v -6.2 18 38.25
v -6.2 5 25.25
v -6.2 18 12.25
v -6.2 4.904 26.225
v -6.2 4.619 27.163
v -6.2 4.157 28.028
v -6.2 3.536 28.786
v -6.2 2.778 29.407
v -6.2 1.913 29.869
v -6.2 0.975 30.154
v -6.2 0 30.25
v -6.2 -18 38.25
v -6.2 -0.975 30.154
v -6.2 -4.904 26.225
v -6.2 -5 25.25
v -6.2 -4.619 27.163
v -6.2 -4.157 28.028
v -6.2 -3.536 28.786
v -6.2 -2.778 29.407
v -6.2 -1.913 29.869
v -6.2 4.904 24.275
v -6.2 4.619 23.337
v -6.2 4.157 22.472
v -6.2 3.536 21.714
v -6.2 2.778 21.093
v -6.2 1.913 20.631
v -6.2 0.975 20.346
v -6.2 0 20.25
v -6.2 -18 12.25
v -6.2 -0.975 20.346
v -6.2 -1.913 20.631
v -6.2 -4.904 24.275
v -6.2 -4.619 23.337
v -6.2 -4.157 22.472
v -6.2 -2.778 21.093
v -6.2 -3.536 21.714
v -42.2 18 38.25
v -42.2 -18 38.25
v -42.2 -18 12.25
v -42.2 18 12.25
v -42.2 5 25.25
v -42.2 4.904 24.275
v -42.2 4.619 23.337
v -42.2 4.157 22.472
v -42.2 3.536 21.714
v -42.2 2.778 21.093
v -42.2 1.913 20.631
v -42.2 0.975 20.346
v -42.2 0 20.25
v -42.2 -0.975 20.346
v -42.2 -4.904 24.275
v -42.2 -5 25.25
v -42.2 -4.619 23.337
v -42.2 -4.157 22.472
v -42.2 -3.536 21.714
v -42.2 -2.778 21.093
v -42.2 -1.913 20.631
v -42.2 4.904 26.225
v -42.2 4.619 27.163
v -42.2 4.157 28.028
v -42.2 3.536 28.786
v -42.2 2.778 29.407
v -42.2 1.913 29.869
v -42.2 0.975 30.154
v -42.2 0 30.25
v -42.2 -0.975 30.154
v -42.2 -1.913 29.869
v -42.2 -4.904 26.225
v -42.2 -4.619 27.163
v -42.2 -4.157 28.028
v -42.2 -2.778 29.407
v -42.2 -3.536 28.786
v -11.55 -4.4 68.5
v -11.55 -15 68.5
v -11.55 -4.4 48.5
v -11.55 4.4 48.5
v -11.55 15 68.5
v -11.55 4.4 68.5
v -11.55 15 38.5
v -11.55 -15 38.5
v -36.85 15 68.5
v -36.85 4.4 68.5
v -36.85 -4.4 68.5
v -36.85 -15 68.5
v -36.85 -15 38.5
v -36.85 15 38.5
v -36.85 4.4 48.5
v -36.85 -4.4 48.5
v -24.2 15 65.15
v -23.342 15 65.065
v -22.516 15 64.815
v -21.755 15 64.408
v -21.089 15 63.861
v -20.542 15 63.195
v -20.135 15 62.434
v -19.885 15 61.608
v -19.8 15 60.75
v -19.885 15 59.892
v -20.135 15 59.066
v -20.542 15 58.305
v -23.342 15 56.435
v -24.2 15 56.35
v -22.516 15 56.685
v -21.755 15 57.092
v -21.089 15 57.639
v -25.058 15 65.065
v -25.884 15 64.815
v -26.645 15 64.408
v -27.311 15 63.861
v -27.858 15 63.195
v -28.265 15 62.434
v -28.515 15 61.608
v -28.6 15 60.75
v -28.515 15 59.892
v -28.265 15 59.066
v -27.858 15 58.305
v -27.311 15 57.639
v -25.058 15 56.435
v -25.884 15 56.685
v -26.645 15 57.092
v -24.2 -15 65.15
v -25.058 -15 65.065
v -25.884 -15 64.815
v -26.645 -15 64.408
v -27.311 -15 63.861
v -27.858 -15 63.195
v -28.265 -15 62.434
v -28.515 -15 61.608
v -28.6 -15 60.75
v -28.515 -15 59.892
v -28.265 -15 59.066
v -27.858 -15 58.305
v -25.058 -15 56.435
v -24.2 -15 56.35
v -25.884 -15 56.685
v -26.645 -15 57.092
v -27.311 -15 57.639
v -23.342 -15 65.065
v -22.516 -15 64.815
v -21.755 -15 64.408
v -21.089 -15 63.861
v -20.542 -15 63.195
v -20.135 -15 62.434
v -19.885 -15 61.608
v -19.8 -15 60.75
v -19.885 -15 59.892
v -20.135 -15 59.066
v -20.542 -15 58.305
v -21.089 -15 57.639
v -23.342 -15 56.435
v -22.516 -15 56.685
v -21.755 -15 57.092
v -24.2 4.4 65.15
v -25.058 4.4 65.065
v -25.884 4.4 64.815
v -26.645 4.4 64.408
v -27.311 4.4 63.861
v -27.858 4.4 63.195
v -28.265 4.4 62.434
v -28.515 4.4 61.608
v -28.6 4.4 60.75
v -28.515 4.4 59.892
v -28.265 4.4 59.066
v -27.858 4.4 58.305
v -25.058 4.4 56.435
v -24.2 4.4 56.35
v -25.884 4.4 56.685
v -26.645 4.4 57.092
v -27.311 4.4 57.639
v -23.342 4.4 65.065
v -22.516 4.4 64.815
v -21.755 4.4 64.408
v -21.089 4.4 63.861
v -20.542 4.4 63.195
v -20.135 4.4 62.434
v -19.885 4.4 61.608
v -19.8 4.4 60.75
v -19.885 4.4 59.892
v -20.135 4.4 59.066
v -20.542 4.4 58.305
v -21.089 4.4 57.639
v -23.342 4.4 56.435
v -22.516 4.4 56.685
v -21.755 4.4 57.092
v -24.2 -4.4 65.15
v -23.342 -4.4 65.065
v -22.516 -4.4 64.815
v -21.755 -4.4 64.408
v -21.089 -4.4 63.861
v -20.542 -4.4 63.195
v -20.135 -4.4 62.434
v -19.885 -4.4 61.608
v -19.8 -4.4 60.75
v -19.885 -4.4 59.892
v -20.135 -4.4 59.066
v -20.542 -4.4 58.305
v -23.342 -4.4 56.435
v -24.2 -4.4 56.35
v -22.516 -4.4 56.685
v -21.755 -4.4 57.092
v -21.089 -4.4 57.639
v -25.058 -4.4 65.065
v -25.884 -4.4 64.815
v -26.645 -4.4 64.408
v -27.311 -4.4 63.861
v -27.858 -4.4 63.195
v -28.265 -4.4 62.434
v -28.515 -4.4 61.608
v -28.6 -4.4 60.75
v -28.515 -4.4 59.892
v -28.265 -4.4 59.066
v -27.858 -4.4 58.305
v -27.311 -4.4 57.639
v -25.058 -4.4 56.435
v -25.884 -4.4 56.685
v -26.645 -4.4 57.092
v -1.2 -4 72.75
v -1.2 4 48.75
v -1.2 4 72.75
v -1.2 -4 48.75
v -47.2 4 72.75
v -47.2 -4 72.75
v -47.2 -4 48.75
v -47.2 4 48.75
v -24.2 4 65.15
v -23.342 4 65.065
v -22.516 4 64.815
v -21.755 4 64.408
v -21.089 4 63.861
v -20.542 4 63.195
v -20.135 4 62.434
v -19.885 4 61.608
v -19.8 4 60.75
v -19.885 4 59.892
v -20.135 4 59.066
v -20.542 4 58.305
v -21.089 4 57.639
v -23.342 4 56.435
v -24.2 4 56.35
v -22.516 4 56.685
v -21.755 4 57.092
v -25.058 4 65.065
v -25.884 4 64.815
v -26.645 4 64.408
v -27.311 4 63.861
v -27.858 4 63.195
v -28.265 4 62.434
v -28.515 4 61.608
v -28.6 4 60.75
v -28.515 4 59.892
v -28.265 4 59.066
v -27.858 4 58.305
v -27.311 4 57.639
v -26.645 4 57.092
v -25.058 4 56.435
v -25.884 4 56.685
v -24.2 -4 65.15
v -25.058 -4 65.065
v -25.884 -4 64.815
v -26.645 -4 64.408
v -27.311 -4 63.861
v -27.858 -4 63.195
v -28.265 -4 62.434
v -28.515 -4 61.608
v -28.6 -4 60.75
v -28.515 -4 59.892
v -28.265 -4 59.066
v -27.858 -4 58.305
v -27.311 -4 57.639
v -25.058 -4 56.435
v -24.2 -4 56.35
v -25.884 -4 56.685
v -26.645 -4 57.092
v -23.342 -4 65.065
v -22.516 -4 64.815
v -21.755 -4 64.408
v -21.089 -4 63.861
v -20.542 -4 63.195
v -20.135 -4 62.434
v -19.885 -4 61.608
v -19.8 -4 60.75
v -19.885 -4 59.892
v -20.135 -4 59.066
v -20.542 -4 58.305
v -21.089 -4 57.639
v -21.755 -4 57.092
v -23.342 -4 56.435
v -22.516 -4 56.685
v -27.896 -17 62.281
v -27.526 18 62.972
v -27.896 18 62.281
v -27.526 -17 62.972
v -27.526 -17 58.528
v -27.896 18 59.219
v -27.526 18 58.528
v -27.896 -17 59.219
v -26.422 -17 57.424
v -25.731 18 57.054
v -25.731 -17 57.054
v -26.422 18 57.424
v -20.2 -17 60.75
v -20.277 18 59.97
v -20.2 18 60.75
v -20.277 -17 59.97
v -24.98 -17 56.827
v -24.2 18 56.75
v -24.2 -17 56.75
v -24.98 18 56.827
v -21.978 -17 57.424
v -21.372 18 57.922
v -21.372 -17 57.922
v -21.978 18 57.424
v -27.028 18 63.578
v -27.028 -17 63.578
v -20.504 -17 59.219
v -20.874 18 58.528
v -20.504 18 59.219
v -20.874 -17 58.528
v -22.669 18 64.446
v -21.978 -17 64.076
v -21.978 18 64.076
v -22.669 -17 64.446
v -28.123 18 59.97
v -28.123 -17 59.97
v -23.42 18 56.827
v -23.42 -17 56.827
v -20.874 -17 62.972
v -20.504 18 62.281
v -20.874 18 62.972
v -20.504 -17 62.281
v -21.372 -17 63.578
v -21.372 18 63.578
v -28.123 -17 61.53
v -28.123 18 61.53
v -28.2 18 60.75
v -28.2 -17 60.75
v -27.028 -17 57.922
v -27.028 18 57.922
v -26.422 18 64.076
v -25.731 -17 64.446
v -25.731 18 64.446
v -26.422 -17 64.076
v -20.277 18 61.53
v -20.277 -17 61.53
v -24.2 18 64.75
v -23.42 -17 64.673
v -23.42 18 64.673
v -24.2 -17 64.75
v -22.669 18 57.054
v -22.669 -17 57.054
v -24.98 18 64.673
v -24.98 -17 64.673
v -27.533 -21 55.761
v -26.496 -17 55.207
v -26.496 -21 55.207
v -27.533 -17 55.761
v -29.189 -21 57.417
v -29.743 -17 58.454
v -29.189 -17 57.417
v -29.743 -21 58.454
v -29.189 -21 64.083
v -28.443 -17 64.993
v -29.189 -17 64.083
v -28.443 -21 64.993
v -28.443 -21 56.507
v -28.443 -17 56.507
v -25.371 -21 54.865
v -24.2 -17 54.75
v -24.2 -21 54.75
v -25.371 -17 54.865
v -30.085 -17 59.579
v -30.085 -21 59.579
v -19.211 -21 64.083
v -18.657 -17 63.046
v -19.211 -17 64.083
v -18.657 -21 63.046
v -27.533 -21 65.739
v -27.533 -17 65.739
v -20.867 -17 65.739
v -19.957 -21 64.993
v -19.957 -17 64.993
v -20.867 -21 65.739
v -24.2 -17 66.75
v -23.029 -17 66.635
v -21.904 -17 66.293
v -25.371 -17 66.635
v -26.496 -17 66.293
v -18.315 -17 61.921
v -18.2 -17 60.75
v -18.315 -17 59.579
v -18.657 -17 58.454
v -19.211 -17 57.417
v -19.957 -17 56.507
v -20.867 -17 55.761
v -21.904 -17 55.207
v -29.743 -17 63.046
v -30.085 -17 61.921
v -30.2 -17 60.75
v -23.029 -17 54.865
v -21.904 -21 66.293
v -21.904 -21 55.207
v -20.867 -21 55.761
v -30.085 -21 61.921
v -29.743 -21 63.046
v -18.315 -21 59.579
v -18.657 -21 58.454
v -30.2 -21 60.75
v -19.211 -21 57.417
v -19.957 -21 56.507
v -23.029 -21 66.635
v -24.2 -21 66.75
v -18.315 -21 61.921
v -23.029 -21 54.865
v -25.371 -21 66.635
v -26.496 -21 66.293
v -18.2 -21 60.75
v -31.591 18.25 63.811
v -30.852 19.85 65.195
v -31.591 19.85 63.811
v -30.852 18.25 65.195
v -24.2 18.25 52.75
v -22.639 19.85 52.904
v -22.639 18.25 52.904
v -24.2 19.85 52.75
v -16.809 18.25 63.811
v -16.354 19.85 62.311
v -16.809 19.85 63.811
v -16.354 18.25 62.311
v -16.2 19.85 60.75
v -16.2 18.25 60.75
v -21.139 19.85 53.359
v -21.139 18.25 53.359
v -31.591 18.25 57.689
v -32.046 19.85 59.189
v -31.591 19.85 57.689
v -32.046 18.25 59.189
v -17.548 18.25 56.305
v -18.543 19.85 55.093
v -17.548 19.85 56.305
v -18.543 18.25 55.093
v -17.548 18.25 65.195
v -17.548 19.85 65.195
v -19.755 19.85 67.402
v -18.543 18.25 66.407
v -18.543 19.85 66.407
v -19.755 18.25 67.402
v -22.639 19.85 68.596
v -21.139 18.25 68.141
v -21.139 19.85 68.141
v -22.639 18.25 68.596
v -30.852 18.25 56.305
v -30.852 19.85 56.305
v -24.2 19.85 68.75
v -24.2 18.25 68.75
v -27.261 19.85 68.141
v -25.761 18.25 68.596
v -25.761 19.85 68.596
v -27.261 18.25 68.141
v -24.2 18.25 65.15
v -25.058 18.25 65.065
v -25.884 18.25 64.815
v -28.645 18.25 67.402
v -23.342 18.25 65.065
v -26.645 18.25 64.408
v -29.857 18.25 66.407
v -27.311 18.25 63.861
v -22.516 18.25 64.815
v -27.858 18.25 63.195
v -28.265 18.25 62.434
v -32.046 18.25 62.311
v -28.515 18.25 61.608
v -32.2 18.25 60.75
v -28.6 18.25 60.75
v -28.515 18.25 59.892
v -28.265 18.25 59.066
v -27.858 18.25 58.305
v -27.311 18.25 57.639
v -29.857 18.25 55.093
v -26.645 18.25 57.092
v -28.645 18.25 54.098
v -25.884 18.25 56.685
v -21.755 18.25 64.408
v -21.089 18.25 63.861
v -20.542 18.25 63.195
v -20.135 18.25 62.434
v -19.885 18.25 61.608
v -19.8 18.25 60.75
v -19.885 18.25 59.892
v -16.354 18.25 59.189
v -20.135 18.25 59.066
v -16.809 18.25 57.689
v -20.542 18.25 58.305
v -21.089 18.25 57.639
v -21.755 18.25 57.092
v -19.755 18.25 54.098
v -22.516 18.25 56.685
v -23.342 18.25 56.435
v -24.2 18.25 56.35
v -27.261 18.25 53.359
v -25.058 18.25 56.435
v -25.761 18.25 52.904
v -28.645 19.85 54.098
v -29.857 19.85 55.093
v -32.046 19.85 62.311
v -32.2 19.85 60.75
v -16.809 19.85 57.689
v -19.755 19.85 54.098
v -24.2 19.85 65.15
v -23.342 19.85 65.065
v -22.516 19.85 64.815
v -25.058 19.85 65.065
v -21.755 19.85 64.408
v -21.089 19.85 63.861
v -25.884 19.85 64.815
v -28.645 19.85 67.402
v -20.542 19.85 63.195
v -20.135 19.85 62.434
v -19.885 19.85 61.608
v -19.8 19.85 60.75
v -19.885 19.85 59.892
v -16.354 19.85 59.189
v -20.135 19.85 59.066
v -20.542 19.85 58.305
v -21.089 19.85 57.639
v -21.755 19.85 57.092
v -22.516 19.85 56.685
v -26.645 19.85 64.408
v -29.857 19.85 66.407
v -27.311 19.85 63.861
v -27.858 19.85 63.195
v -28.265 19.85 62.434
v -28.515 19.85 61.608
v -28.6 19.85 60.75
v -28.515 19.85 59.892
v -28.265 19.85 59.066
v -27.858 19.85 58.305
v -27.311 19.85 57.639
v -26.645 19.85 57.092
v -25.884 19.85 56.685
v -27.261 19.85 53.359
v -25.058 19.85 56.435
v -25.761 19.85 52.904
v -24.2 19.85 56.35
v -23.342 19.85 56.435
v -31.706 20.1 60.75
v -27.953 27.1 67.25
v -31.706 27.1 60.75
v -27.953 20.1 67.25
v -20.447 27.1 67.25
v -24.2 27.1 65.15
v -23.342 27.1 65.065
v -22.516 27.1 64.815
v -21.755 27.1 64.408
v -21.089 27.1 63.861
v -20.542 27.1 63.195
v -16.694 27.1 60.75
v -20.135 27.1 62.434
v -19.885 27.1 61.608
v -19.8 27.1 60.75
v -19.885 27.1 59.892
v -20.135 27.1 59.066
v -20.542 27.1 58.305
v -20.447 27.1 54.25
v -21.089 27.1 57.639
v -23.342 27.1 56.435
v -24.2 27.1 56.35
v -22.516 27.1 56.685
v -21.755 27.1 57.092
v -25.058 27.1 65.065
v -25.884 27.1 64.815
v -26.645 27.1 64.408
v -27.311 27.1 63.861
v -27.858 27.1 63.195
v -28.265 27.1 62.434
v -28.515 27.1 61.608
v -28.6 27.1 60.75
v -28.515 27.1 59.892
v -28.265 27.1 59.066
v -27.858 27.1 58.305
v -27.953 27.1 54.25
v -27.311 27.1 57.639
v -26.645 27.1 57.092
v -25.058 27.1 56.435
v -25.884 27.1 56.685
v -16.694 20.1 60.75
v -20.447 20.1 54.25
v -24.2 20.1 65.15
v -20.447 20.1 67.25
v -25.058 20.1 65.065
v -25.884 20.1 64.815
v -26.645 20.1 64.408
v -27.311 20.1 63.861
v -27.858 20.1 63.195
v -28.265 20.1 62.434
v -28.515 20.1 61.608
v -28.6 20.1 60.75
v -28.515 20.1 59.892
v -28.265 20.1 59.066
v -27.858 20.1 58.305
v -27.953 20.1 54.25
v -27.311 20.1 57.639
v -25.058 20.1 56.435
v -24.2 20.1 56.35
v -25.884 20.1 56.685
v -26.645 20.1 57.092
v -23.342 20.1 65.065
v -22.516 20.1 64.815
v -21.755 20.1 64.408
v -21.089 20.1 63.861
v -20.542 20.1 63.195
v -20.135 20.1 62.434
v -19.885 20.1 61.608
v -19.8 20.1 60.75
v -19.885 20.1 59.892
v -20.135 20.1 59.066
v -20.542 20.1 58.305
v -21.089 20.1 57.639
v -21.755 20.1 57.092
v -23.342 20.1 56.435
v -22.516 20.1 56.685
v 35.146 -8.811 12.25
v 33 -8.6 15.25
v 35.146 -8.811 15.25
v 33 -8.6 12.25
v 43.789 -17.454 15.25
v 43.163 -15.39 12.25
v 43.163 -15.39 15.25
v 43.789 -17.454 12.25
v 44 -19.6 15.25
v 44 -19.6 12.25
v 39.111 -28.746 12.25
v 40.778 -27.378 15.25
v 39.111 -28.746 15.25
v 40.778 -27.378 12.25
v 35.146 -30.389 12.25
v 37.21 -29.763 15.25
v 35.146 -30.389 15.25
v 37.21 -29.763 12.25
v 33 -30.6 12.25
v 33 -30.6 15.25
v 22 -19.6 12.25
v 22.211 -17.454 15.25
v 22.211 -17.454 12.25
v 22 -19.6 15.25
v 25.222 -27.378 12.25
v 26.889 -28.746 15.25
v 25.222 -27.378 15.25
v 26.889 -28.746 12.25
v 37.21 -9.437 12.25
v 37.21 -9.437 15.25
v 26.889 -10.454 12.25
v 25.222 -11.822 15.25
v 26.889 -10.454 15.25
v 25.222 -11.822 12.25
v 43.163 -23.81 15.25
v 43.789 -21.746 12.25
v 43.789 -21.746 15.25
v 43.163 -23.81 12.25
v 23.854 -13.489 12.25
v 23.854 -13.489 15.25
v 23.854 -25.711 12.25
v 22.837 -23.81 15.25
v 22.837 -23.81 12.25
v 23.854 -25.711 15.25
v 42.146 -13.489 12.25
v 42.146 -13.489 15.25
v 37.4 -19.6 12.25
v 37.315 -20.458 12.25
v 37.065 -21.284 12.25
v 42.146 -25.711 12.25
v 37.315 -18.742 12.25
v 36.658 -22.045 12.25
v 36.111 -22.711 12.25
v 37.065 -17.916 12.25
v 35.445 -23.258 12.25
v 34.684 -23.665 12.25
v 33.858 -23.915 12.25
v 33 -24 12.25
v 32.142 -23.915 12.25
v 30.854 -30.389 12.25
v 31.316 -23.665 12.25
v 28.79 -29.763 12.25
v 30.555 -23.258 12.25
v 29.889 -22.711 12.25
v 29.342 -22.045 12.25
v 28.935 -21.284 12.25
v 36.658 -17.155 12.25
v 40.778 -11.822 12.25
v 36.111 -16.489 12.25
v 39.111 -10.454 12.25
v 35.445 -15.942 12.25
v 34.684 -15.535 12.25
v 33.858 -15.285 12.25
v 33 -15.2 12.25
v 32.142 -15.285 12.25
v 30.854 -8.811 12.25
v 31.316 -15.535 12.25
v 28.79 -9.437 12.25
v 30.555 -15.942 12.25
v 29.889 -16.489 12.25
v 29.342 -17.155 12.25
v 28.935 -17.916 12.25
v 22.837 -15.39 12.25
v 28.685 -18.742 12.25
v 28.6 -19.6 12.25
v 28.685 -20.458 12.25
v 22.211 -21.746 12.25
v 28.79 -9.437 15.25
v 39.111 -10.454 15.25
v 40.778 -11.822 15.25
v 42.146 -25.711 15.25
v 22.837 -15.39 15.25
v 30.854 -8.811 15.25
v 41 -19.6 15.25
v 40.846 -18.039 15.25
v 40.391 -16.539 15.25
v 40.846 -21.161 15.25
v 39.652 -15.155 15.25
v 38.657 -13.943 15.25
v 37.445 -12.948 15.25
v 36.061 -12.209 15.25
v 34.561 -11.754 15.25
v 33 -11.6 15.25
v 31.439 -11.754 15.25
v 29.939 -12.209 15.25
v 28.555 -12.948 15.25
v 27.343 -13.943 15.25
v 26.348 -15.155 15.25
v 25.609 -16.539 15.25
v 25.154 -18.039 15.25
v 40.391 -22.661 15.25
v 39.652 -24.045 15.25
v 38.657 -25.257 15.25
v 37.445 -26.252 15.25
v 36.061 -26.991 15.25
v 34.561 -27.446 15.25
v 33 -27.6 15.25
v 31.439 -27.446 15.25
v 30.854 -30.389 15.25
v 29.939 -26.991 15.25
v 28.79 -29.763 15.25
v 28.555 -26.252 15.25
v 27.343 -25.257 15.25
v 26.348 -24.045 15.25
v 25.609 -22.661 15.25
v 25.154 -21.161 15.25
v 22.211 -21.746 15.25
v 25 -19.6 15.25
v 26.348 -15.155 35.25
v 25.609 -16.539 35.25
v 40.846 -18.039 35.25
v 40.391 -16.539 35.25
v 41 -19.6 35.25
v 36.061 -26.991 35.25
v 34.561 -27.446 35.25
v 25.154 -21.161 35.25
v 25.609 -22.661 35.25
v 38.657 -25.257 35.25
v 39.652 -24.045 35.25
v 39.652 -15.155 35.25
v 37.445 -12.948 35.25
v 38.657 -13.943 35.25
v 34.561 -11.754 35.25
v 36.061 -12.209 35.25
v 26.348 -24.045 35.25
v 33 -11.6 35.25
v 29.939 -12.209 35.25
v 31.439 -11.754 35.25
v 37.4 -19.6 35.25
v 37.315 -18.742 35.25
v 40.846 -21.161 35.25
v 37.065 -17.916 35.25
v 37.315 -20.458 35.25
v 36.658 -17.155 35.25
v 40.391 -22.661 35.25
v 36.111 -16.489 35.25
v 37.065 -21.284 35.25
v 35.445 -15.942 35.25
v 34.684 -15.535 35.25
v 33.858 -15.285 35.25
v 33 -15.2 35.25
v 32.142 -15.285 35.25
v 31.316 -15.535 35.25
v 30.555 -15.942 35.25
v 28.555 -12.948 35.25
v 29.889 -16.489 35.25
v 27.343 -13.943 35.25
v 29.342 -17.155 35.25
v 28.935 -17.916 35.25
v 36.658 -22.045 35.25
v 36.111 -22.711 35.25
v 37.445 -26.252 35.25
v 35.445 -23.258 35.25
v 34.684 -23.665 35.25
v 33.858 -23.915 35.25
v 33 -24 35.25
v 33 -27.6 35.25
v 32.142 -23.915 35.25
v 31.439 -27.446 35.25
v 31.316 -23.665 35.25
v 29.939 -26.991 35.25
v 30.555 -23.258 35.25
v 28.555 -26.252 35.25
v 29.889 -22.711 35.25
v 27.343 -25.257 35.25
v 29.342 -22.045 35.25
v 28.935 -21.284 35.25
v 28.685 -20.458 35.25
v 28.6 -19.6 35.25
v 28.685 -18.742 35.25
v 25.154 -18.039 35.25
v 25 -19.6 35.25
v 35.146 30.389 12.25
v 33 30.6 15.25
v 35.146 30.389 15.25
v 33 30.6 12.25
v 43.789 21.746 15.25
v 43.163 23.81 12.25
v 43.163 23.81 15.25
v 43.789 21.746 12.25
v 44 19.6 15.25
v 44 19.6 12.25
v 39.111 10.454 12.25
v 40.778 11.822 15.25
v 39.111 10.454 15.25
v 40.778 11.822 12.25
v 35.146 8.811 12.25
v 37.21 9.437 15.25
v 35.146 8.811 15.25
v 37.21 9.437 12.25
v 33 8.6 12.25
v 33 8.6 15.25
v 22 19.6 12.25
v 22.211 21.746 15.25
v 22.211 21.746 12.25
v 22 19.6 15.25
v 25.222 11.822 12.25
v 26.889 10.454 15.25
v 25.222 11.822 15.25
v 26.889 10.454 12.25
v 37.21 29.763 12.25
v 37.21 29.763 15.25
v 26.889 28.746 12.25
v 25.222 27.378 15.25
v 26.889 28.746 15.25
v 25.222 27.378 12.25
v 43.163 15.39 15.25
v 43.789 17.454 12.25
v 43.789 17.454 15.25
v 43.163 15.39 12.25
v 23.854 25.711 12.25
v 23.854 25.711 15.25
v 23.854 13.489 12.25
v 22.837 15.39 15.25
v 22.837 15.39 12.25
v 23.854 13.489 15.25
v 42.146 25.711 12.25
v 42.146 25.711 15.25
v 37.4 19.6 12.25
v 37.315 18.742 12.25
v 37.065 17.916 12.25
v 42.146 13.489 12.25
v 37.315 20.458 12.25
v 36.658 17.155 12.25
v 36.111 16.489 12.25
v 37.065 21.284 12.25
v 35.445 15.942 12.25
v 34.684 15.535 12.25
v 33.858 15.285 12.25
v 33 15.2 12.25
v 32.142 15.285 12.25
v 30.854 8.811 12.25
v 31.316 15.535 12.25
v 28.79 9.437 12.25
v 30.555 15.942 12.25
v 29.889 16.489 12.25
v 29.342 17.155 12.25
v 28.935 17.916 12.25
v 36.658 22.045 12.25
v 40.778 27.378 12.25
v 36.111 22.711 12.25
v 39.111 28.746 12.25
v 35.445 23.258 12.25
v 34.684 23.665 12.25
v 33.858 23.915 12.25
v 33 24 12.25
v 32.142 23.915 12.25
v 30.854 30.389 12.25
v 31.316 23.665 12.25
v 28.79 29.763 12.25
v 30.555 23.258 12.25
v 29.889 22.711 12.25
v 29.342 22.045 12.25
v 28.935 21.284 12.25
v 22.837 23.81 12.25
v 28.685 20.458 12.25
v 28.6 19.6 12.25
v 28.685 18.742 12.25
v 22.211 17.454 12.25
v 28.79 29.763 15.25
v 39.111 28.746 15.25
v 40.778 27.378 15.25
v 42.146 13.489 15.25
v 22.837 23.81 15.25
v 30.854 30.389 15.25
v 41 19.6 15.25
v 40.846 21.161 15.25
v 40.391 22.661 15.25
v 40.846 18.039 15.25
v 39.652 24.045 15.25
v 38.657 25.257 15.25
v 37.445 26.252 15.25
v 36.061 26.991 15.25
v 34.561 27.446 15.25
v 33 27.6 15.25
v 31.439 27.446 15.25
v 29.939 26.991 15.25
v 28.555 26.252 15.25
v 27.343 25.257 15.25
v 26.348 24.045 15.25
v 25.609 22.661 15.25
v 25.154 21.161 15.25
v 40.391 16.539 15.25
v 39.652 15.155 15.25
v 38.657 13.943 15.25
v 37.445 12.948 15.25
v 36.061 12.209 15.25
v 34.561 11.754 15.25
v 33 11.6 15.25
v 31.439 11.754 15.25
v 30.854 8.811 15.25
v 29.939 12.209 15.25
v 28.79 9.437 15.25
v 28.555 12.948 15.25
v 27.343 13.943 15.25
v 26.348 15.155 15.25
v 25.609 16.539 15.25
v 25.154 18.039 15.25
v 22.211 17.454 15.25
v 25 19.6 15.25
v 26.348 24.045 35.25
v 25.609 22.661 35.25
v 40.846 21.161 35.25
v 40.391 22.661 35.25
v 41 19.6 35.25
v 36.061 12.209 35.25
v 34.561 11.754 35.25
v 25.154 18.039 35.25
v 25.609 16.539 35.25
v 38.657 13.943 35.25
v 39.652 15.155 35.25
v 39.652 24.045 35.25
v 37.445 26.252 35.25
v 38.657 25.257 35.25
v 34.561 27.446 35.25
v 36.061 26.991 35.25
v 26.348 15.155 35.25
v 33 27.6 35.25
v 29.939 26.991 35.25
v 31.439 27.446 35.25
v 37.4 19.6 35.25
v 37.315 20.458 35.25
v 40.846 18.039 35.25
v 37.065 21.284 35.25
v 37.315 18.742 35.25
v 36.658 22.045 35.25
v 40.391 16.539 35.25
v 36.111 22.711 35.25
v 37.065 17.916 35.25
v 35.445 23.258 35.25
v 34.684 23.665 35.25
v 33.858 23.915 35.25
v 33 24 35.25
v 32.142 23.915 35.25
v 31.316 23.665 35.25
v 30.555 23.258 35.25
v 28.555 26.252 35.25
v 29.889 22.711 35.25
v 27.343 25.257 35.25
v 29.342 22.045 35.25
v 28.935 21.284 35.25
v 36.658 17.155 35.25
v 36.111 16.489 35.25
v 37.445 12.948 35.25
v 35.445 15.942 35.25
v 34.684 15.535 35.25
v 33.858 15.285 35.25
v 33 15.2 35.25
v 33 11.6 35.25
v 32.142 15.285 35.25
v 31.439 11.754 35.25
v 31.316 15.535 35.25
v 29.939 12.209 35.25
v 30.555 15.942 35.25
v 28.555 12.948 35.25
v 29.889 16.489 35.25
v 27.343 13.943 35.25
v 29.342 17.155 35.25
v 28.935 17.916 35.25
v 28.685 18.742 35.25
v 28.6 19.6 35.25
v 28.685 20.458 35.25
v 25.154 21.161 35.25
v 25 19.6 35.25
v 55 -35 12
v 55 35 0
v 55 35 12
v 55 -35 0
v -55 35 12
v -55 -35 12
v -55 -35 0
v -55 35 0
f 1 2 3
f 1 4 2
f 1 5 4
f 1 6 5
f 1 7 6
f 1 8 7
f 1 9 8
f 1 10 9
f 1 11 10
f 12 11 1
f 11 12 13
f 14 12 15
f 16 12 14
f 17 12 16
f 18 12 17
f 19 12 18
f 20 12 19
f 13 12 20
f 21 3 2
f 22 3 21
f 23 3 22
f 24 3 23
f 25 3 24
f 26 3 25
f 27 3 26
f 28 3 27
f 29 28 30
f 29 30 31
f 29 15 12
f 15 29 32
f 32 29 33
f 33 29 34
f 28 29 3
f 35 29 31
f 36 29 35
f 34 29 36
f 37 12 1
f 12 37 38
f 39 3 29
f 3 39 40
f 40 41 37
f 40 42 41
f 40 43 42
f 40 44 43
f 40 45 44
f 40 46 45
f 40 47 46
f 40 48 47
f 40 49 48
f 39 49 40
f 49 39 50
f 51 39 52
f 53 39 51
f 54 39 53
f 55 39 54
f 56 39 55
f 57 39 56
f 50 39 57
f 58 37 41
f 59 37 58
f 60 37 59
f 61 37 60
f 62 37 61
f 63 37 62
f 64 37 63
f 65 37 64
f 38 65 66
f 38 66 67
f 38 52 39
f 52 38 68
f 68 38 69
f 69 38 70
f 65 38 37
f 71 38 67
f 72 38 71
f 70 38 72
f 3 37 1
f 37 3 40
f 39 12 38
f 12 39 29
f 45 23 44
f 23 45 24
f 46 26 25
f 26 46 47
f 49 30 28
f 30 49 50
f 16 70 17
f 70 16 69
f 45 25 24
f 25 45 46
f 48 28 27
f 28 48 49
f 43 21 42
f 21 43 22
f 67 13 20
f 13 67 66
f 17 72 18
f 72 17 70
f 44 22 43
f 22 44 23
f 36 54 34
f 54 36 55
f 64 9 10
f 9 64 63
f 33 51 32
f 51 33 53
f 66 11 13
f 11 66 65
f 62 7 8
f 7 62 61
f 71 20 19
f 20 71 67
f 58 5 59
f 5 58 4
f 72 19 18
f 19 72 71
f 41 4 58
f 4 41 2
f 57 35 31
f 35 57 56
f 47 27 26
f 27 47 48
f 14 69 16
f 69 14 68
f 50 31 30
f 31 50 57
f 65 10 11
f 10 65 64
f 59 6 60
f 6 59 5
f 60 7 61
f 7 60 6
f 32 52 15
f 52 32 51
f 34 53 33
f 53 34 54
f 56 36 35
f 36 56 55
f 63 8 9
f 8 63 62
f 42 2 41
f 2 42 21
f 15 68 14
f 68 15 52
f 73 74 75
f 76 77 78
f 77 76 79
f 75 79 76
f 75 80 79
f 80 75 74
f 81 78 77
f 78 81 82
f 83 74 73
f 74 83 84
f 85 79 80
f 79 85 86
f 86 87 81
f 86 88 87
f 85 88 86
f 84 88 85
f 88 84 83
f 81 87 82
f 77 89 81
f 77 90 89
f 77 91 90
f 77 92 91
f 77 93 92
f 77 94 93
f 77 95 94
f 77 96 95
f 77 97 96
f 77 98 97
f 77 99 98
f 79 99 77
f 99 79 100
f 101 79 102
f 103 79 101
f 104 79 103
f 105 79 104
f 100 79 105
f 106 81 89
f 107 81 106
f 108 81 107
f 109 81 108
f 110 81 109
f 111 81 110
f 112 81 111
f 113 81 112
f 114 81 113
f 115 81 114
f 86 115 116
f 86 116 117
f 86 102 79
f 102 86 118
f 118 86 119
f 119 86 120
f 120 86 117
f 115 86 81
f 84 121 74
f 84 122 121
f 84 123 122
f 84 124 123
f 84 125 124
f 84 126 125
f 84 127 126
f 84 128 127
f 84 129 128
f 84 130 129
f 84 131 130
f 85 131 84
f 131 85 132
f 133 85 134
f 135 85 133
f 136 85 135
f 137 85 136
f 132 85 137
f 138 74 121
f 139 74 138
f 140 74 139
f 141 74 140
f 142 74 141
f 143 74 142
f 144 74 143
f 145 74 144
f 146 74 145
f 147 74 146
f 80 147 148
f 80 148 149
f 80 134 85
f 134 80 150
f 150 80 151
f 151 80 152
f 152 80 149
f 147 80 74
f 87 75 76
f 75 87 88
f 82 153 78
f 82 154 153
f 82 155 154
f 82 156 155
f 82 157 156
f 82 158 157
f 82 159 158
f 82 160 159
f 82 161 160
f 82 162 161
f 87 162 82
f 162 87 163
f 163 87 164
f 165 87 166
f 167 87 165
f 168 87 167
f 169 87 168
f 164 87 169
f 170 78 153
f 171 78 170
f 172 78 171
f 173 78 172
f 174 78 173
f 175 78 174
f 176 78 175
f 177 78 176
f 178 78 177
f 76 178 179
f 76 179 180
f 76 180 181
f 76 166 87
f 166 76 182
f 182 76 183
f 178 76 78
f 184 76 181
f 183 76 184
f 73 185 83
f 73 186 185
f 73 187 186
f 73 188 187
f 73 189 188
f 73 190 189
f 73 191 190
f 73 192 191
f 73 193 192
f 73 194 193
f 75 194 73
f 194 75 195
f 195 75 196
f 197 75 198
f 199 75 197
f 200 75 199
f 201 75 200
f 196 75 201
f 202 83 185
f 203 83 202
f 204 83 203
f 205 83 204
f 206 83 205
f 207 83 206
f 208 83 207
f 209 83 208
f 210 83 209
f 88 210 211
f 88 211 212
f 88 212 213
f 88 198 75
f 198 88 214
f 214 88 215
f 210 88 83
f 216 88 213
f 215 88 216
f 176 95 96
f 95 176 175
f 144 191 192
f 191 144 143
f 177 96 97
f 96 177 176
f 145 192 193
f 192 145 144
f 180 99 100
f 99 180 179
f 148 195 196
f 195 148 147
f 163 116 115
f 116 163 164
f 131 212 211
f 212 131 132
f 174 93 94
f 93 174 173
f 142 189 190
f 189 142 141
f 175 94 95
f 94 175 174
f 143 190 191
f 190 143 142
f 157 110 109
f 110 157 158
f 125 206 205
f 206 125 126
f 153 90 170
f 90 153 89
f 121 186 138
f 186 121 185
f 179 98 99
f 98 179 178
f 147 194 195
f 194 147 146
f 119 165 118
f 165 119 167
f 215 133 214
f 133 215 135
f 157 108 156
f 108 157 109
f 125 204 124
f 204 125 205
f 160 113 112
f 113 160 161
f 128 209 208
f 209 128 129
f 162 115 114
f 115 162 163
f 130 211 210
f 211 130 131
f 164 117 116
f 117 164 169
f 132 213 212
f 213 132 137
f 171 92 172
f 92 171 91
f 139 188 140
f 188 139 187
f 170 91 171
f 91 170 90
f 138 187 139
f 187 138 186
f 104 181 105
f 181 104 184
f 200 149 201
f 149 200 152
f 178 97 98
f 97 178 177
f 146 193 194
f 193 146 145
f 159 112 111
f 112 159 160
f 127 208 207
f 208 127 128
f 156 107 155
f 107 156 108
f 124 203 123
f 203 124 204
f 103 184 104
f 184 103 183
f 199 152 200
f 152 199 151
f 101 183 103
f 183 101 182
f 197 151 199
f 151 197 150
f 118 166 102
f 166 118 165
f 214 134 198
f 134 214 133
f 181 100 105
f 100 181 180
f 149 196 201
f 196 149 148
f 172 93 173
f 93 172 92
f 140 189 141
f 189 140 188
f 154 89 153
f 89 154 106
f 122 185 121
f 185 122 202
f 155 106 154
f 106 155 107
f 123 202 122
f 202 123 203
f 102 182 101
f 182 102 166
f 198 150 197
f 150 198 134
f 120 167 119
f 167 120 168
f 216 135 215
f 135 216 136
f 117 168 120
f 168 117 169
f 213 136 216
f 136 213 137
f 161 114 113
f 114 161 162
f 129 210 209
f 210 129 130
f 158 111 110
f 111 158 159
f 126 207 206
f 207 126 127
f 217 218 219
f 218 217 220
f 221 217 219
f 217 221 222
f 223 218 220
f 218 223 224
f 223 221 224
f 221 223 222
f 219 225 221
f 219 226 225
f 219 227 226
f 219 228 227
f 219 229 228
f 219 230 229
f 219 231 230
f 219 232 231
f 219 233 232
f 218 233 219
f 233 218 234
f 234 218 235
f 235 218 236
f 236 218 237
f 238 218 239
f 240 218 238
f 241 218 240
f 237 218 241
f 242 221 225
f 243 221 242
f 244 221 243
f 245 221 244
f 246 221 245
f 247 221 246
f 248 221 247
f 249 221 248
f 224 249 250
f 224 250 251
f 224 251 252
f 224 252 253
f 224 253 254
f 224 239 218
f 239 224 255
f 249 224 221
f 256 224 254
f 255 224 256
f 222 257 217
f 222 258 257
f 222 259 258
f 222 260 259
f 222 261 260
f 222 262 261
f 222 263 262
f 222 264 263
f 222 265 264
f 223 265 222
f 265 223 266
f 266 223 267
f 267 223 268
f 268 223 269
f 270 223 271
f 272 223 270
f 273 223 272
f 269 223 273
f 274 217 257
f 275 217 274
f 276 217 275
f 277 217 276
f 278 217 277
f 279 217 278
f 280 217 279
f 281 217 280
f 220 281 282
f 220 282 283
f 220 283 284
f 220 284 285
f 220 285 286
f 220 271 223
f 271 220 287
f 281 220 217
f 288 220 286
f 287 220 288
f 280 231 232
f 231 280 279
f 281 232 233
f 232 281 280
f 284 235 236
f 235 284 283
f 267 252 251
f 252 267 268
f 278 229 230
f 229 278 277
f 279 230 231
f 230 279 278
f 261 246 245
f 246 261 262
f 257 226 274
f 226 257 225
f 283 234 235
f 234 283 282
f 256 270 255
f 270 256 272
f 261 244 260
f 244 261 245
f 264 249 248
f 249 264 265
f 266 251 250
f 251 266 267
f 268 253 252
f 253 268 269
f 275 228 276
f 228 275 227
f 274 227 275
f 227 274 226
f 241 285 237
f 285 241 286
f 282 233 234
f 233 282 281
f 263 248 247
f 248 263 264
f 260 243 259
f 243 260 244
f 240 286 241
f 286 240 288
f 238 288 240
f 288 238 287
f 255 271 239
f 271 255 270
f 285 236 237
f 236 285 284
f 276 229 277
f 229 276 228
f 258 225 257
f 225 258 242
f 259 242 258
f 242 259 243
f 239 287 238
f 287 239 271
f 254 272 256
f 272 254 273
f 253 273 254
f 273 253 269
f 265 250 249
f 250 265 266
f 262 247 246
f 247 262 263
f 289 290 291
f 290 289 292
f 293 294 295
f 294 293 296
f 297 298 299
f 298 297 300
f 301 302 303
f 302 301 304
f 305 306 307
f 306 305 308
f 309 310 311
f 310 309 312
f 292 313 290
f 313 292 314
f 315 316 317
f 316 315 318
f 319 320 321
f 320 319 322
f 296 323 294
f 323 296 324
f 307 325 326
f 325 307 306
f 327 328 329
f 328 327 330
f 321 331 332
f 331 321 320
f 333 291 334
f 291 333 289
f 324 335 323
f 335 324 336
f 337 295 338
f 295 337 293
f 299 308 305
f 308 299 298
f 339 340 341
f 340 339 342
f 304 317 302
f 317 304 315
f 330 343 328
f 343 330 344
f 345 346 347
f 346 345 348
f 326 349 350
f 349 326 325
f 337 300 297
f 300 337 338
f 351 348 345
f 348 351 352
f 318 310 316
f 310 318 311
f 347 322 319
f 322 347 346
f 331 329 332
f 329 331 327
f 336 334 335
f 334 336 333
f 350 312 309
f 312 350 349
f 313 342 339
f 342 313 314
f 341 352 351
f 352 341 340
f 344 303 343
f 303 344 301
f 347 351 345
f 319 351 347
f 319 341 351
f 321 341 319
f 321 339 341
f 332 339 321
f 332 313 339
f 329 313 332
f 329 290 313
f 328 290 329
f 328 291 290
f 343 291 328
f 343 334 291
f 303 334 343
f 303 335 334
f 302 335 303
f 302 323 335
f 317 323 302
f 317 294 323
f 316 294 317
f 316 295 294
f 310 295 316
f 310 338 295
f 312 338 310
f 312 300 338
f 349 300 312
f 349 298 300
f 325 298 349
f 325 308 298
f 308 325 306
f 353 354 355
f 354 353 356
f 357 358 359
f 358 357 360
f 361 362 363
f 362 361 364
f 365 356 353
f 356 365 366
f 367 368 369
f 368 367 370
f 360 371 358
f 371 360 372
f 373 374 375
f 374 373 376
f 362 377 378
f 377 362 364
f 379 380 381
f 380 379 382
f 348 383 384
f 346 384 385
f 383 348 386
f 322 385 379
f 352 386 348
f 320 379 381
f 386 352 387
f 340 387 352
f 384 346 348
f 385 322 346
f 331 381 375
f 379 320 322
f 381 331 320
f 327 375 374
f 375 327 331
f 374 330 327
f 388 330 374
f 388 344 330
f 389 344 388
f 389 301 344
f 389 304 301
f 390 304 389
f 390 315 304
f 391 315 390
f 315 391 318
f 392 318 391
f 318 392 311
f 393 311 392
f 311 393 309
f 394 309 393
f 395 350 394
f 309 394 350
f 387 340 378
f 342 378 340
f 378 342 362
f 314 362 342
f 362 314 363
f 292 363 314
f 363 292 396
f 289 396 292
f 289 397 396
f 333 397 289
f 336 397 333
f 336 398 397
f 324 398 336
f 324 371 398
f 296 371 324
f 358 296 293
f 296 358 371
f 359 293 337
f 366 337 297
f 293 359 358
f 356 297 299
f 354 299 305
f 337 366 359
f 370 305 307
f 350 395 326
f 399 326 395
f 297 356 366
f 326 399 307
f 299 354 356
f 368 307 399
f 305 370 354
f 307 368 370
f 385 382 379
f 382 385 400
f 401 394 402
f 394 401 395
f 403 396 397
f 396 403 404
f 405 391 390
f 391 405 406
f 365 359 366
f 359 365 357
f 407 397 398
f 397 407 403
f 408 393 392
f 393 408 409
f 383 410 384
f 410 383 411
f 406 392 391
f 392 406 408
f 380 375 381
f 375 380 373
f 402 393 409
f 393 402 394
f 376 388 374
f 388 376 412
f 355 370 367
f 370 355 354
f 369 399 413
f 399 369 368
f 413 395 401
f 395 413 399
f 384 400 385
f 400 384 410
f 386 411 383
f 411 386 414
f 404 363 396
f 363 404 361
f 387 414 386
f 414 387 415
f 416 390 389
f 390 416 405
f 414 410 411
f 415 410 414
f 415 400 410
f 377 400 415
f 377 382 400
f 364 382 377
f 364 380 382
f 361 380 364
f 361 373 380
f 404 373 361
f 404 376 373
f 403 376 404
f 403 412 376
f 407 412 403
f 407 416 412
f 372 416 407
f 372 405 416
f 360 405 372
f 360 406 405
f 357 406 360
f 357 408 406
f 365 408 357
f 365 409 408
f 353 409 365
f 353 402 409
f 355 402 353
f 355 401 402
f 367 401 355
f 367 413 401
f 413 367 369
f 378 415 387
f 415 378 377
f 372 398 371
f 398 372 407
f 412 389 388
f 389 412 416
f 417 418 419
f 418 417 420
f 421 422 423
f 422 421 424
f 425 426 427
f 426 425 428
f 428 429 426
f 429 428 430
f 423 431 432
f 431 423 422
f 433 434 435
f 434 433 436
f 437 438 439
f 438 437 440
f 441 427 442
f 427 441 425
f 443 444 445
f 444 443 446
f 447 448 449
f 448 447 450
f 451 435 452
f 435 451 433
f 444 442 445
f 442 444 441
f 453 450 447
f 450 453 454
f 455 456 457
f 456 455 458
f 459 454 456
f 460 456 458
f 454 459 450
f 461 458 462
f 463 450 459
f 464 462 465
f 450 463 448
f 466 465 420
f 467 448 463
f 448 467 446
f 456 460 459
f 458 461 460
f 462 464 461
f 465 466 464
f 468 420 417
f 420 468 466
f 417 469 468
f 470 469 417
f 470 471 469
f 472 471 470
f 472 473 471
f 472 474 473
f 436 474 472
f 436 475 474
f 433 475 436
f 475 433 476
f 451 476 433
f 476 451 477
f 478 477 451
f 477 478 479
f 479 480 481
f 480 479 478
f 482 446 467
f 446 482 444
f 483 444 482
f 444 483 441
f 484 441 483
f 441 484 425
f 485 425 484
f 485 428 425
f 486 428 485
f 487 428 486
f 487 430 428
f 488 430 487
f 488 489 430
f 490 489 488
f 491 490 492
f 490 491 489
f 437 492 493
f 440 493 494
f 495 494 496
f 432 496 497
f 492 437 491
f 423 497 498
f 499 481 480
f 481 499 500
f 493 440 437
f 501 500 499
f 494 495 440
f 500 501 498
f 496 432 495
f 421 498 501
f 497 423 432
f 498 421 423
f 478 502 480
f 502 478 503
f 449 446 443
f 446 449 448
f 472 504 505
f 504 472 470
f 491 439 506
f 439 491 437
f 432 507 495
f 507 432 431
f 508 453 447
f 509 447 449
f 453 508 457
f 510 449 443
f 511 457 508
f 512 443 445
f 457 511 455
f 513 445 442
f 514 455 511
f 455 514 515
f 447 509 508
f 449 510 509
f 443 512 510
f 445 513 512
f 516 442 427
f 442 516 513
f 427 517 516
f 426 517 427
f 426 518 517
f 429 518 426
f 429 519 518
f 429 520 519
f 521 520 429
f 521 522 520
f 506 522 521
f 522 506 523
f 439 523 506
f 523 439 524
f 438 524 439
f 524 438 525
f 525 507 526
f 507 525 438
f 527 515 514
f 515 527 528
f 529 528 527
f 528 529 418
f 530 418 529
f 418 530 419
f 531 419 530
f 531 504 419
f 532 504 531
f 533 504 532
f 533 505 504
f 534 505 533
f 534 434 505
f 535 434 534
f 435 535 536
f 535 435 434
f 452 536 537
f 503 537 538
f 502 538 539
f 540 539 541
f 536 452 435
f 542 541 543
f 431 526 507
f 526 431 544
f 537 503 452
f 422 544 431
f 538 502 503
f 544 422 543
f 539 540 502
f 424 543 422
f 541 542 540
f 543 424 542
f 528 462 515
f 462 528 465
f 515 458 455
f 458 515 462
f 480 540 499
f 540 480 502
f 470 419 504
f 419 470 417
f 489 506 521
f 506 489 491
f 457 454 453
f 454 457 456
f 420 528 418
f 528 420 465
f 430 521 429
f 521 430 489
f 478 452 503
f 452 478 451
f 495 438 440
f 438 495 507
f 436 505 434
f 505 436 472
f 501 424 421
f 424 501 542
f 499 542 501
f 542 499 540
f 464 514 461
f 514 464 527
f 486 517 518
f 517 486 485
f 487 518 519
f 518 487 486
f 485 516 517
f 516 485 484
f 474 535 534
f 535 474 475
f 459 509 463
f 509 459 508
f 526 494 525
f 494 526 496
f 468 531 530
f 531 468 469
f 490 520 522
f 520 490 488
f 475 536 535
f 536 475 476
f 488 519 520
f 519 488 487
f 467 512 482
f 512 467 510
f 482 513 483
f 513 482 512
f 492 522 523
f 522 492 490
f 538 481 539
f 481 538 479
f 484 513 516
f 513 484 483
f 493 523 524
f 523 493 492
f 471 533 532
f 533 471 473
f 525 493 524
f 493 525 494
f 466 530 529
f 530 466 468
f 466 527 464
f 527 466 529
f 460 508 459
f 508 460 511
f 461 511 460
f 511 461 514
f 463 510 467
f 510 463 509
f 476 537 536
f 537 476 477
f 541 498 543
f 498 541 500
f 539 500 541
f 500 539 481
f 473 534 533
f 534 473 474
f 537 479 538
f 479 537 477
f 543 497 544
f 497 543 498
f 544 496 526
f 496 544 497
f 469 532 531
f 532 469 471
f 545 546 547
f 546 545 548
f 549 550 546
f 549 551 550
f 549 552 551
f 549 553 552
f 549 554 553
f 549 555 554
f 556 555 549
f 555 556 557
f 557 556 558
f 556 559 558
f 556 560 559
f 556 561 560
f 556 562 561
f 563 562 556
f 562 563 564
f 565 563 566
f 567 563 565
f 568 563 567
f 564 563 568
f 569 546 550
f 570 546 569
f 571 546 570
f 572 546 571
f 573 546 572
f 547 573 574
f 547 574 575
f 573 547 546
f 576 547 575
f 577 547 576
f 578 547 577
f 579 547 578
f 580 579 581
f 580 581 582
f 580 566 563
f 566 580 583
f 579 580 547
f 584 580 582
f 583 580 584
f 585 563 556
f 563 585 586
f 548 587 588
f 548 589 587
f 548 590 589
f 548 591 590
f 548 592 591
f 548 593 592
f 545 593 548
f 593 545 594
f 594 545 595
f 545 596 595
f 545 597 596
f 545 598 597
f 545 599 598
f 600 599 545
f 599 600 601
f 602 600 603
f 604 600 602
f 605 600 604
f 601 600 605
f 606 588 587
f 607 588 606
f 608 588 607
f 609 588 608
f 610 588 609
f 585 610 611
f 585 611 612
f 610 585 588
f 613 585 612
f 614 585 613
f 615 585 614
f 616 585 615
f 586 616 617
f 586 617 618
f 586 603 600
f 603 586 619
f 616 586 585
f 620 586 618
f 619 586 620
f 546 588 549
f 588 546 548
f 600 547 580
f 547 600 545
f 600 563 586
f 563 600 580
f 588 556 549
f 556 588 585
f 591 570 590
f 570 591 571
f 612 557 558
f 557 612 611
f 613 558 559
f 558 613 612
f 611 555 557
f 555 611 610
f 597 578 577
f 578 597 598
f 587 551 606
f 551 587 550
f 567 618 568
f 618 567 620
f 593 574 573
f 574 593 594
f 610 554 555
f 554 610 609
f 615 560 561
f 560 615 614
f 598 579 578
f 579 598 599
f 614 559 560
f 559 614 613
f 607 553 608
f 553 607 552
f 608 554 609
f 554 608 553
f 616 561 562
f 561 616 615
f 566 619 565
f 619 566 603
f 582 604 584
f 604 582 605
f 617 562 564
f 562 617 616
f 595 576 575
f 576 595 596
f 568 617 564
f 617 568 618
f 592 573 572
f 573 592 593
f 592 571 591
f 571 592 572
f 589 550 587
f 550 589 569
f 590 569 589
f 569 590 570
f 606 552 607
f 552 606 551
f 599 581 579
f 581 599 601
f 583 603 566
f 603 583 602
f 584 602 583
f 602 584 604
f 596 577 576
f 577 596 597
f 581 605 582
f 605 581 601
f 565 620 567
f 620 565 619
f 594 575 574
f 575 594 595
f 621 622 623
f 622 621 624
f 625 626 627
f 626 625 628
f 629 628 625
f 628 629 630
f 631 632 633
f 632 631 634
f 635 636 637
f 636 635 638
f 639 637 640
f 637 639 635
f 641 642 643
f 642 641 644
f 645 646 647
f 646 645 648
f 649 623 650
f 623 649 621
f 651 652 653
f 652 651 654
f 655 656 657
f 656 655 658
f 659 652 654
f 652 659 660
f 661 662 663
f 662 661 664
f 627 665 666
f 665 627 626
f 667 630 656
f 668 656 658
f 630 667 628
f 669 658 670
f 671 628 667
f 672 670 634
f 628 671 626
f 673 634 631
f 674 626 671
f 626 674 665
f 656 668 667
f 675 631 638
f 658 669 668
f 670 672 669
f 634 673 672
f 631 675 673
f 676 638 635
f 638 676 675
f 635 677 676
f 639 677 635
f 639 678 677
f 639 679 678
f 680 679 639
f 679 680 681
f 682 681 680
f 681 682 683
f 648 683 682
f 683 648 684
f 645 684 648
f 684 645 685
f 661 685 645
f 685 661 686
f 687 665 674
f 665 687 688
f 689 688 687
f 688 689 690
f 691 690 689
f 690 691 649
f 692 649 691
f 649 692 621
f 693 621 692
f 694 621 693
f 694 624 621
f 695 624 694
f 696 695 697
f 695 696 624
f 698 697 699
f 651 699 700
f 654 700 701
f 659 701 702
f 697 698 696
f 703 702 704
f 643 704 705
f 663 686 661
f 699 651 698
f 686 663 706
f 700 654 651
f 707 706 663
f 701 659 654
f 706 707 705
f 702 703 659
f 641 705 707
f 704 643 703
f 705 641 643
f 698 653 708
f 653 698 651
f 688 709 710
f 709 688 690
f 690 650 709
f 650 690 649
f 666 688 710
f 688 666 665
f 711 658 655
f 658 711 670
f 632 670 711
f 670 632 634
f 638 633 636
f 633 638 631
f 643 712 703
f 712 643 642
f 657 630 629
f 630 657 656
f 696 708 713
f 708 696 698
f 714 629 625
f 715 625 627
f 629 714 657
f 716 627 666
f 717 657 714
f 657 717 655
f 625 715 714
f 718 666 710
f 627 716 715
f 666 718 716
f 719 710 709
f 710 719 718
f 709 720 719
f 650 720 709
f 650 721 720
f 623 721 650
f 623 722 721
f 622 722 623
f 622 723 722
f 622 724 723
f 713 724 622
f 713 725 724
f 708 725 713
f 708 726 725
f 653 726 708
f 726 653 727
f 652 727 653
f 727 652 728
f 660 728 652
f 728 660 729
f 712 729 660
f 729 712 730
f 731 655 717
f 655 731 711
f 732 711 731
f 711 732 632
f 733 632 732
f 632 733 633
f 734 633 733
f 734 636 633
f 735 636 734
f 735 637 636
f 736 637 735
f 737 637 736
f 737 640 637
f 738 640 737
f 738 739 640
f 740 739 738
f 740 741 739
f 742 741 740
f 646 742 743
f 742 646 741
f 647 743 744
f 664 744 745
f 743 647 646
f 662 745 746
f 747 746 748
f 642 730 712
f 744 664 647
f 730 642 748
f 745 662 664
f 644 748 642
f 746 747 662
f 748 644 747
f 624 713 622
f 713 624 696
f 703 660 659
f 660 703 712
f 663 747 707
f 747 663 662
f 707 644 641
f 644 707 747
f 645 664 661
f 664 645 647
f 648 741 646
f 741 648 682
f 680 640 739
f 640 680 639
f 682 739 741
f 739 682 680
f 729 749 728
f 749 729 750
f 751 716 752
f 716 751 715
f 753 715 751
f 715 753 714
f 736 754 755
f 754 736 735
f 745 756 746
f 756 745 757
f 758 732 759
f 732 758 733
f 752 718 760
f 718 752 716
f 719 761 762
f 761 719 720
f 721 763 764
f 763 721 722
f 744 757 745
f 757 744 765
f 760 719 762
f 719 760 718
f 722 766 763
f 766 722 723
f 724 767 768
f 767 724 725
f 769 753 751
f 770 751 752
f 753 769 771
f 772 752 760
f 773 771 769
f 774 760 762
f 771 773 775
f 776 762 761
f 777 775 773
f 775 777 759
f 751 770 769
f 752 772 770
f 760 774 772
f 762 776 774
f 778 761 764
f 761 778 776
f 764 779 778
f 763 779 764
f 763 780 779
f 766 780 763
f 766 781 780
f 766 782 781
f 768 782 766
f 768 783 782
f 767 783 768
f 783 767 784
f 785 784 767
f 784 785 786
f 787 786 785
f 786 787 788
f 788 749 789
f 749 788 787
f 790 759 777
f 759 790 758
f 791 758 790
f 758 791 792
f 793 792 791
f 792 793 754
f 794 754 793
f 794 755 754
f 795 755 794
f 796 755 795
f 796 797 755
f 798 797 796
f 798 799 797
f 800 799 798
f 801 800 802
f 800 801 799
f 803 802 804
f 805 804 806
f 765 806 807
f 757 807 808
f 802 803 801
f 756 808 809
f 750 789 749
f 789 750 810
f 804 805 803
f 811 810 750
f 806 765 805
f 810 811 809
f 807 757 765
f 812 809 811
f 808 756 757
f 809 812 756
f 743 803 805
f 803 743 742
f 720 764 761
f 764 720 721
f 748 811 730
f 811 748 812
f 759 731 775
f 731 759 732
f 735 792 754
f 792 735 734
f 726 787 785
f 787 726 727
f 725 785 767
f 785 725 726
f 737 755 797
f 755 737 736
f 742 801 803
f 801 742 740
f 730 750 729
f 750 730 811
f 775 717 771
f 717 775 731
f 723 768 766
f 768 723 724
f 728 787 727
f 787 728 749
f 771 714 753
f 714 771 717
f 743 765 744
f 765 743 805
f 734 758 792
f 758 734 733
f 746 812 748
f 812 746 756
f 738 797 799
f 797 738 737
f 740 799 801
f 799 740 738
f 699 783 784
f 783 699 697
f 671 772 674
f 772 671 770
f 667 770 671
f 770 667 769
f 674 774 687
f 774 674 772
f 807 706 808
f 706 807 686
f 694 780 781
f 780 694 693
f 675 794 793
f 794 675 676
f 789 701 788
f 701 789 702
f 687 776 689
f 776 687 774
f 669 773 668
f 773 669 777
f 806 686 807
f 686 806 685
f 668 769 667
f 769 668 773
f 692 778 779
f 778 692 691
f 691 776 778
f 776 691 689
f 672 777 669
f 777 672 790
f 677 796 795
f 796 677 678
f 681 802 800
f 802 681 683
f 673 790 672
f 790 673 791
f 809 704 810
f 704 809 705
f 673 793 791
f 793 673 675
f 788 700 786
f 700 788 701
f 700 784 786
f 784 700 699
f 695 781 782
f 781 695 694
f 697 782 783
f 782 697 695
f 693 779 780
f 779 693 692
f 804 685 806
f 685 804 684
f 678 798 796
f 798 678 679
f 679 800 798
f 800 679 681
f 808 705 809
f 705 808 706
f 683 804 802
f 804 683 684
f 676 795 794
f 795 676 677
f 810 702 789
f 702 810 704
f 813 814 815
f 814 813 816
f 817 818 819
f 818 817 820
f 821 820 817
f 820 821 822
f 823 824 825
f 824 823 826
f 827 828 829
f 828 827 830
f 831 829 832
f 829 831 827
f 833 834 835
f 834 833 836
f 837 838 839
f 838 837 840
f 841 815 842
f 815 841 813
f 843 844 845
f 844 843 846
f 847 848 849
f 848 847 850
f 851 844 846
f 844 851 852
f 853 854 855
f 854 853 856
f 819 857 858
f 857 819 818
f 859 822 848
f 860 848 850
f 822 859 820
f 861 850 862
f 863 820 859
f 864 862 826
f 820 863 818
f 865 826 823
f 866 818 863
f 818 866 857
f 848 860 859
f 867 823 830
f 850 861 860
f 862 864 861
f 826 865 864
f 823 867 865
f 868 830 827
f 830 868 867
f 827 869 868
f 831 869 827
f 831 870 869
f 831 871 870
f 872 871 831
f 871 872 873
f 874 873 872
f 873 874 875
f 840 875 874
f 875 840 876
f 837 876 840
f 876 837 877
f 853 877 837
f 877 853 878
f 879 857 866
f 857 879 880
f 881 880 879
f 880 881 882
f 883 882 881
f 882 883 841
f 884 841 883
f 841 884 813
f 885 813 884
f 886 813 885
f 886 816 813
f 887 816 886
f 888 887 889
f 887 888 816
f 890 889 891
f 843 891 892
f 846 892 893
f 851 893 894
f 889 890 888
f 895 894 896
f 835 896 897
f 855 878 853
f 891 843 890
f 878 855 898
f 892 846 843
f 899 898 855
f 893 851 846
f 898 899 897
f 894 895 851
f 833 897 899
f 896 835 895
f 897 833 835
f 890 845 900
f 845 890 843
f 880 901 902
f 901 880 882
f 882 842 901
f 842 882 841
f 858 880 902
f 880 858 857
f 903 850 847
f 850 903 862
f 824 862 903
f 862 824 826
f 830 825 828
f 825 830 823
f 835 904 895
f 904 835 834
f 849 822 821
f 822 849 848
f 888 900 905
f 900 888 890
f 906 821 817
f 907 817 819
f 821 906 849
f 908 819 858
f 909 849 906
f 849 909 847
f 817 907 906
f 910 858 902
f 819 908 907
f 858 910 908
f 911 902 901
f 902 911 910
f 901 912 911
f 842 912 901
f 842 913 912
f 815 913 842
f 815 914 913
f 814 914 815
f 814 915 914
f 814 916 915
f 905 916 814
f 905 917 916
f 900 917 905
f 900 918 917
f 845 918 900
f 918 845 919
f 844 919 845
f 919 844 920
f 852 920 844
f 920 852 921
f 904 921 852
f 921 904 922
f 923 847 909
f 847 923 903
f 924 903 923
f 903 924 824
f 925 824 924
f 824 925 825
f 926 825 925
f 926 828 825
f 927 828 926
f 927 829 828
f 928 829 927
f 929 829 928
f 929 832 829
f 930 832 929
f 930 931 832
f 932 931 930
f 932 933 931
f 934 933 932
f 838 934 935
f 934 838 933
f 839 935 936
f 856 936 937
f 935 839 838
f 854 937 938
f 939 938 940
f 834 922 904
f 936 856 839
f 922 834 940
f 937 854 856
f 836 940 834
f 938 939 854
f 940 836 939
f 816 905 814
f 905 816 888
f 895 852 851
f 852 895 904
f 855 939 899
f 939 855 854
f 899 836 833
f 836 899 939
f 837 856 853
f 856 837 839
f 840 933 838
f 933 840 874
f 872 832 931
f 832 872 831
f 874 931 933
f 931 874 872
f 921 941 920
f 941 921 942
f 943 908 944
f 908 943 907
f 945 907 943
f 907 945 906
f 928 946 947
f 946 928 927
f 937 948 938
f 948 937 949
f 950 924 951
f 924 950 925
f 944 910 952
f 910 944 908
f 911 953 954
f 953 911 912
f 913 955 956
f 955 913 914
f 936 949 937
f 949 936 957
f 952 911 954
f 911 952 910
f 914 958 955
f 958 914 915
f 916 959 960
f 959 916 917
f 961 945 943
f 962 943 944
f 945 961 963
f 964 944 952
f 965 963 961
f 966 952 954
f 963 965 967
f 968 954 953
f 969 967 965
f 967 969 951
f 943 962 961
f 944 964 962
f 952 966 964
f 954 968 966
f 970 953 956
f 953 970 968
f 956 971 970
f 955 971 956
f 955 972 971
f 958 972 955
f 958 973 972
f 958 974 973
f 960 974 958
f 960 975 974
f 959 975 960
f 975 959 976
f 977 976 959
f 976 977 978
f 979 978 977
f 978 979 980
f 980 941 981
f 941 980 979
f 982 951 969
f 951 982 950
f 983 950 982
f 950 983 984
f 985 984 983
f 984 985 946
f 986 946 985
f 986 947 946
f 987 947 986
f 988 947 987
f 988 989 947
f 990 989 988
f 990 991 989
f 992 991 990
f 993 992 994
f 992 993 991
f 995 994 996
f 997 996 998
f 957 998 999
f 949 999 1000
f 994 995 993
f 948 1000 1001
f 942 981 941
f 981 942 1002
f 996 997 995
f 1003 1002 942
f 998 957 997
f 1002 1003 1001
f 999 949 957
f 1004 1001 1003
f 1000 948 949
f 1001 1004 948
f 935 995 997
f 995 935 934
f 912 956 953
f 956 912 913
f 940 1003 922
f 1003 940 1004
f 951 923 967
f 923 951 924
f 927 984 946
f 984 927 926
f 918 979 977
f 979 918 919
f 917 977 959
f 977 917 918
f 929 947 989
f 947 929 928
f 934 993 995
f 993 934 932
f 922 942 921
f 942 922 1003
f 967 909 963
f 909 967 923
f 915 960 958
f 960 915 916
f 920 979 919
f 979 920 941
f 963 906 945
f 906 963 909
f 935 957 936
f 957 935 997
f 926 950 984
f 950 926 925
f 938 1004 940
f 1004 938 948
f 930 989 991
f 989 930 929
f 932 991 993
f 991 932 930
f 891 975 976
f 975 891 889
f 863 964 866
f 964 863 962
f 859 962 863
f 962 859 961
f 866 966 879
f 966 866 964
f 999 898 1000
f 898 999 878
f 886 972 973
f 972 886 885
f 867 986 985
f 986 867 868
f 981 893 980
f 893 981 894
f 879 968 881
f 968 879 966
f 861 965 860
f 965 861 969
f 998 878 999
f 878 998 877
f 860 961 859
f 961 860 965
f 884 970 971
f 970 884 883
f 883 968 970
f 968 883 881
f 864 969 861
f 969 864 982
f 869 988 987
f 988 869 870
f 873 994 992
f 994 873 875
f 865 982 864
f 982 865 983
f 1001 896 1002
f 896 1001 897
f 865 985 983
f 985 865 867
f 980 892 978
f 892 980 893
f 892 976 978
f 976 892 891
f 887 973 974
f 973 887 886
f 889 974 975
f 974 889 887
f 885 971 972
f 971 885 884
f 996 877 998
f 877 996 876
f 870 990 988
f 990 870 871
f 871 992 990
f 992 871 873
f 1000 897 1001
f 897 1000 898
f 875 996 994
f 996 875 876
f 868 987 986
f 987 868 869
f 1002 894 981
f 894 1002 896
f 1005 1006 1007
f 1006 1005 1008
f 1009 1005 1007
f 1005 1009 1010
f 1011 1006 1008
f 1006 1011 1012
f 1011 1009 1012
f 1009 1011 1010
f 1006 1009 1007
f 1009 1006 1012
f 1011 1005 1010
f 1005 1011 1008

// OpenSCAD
$fn = 32;

// ------------------------------------------------------------------------
// Indexing jig: plate 110 x 70 mm, pin d8
// Every part is its own module, assembly() places every instance.
// ------------------------------------------------------------------------

// --- part 1 ---
module jig_plate() {
  difference() {
    translate([-55, -35, 0]) cube([110, 70, 12]);
  }
}

// --- part 2 ---
module locator_block() {
  difference() {
    translate([-18, -18, 0]) cube([36, 36, 26]);
    translate([0, 0, 13]) rotate([0, 90, 0]) cylinder(h = 38, d = 10, center = true);
  }
}

// --- part 3 ---
module index_fork() {
  difference() {
    translate([-12.65, -15, 0]) cube([25.3, 30, 30]);
    translate([-13.65, -4.4, 10]) cube([27.3, 8.8, 21]);
    translate([0, 0, 22.25]) rotate([90, 0, 0]) cylinder(h = 32, d = 8.8, center = true);
  }
}

// --- part 4 ---
module index_arm() {
  difference() {
    translate([-23, -4, 0]) cube([46, 8, 24]);
    translate([0, 0, 12]) rotate([90, 0, 0]) cylinder(h = 10, d = 8.8, center = true);
  }
}

// --- part 5 ---
module index_pin() {
  rotate([0, 90, 0]) cylinder(h = 36, d = 8, center = true);
  translate([-21, 0, 0]) rotate([0, 90, 0]) cylinder(h = 4, d = 12);
}

// --- part 6 ---
module pin_washer() {
  difference() {
      translate([0, 0, 0]) cylinder(h = 1.6, d = 16);
      translate([0, 0, -1]) cylinder(h = 3.6, d = 8.8);
    }
}

// --- part 7 ---
module lock_nut() {
  difference() {
    linear_extrude(height = 7) polygon(points = [[7.506, 0], [3.753, 6.5], [-3.753, 6.5], [-7.506, 0], [-3.753, -6.5], [3.753, -6.5]]);
    translate([0, 0, -1]) cylinder(h = 9, d = 8.8);
  }
}

// --- part 8 ---
module guide_bush_a() {
  difference() {
    union() {
      cylinder(h = 3, d = 22);
      translate([0, 0, 3]) cylinder(h = 20, d = 16);
    }
    translate([0, 0, -1]) cylinder(h = 25, d = 8.8);
  }
}

// --- part 9 ---
module guide_bush_b() {
  difference() {
    union() {
      cylinder(h = 3, d = 22);
      translate([0, 0, 3]) cylinder(h = 20, d = 16);
    }
    translate([0, 0, -1]) cylinder(h = 25, d = 8.8);
  }
}

// --- assembly ---
module assembly() {
  color([0.80, 0.24, 0.20]) translate([0, 0, 0]) rotate([0, 0, 0]) jig_plate();
  color([0.20, 0.45, 0.75]) translate([-24.2, 0, 12.25]) rotate([0, 0, 0]) locator_block();
  color([0.25, 0.62, 0.32]) translate([-24.2, 0, 38.5]) rotate([0, 0, 0]) index_fork();
  color([0.92, 0.70, 0.18]) translate([-24.2, 0, 48.75]) rotate([0, 0, 0]) index_arm();
  color([0.58, 0.35, 0.70]) translate([-24.2, 0, 60.75]) rotate([0, 0, 90]) index_pin();
  color([0.16, 0.66, 0.66]) translate([-24.2, 19.85, 60.75]) rotate([90, 0, 0]) pin_washer();
  color([0.85, 0.48, 0.18]) translate([-24.2, 27.1, 60.75]) rotate([90, 0, 0]) lock_nut();
  color([0.55, 0.60, 0.65]) translate([33, -19.6, 12.25]) rotate([0, 0, 0]) guide_bush_a();
  color([0.75, 0.30, 0.55]) translate([33, 19.6, 12.25]) rotate([0, 0, 0]) guide_bush_b();
}

assembly();
